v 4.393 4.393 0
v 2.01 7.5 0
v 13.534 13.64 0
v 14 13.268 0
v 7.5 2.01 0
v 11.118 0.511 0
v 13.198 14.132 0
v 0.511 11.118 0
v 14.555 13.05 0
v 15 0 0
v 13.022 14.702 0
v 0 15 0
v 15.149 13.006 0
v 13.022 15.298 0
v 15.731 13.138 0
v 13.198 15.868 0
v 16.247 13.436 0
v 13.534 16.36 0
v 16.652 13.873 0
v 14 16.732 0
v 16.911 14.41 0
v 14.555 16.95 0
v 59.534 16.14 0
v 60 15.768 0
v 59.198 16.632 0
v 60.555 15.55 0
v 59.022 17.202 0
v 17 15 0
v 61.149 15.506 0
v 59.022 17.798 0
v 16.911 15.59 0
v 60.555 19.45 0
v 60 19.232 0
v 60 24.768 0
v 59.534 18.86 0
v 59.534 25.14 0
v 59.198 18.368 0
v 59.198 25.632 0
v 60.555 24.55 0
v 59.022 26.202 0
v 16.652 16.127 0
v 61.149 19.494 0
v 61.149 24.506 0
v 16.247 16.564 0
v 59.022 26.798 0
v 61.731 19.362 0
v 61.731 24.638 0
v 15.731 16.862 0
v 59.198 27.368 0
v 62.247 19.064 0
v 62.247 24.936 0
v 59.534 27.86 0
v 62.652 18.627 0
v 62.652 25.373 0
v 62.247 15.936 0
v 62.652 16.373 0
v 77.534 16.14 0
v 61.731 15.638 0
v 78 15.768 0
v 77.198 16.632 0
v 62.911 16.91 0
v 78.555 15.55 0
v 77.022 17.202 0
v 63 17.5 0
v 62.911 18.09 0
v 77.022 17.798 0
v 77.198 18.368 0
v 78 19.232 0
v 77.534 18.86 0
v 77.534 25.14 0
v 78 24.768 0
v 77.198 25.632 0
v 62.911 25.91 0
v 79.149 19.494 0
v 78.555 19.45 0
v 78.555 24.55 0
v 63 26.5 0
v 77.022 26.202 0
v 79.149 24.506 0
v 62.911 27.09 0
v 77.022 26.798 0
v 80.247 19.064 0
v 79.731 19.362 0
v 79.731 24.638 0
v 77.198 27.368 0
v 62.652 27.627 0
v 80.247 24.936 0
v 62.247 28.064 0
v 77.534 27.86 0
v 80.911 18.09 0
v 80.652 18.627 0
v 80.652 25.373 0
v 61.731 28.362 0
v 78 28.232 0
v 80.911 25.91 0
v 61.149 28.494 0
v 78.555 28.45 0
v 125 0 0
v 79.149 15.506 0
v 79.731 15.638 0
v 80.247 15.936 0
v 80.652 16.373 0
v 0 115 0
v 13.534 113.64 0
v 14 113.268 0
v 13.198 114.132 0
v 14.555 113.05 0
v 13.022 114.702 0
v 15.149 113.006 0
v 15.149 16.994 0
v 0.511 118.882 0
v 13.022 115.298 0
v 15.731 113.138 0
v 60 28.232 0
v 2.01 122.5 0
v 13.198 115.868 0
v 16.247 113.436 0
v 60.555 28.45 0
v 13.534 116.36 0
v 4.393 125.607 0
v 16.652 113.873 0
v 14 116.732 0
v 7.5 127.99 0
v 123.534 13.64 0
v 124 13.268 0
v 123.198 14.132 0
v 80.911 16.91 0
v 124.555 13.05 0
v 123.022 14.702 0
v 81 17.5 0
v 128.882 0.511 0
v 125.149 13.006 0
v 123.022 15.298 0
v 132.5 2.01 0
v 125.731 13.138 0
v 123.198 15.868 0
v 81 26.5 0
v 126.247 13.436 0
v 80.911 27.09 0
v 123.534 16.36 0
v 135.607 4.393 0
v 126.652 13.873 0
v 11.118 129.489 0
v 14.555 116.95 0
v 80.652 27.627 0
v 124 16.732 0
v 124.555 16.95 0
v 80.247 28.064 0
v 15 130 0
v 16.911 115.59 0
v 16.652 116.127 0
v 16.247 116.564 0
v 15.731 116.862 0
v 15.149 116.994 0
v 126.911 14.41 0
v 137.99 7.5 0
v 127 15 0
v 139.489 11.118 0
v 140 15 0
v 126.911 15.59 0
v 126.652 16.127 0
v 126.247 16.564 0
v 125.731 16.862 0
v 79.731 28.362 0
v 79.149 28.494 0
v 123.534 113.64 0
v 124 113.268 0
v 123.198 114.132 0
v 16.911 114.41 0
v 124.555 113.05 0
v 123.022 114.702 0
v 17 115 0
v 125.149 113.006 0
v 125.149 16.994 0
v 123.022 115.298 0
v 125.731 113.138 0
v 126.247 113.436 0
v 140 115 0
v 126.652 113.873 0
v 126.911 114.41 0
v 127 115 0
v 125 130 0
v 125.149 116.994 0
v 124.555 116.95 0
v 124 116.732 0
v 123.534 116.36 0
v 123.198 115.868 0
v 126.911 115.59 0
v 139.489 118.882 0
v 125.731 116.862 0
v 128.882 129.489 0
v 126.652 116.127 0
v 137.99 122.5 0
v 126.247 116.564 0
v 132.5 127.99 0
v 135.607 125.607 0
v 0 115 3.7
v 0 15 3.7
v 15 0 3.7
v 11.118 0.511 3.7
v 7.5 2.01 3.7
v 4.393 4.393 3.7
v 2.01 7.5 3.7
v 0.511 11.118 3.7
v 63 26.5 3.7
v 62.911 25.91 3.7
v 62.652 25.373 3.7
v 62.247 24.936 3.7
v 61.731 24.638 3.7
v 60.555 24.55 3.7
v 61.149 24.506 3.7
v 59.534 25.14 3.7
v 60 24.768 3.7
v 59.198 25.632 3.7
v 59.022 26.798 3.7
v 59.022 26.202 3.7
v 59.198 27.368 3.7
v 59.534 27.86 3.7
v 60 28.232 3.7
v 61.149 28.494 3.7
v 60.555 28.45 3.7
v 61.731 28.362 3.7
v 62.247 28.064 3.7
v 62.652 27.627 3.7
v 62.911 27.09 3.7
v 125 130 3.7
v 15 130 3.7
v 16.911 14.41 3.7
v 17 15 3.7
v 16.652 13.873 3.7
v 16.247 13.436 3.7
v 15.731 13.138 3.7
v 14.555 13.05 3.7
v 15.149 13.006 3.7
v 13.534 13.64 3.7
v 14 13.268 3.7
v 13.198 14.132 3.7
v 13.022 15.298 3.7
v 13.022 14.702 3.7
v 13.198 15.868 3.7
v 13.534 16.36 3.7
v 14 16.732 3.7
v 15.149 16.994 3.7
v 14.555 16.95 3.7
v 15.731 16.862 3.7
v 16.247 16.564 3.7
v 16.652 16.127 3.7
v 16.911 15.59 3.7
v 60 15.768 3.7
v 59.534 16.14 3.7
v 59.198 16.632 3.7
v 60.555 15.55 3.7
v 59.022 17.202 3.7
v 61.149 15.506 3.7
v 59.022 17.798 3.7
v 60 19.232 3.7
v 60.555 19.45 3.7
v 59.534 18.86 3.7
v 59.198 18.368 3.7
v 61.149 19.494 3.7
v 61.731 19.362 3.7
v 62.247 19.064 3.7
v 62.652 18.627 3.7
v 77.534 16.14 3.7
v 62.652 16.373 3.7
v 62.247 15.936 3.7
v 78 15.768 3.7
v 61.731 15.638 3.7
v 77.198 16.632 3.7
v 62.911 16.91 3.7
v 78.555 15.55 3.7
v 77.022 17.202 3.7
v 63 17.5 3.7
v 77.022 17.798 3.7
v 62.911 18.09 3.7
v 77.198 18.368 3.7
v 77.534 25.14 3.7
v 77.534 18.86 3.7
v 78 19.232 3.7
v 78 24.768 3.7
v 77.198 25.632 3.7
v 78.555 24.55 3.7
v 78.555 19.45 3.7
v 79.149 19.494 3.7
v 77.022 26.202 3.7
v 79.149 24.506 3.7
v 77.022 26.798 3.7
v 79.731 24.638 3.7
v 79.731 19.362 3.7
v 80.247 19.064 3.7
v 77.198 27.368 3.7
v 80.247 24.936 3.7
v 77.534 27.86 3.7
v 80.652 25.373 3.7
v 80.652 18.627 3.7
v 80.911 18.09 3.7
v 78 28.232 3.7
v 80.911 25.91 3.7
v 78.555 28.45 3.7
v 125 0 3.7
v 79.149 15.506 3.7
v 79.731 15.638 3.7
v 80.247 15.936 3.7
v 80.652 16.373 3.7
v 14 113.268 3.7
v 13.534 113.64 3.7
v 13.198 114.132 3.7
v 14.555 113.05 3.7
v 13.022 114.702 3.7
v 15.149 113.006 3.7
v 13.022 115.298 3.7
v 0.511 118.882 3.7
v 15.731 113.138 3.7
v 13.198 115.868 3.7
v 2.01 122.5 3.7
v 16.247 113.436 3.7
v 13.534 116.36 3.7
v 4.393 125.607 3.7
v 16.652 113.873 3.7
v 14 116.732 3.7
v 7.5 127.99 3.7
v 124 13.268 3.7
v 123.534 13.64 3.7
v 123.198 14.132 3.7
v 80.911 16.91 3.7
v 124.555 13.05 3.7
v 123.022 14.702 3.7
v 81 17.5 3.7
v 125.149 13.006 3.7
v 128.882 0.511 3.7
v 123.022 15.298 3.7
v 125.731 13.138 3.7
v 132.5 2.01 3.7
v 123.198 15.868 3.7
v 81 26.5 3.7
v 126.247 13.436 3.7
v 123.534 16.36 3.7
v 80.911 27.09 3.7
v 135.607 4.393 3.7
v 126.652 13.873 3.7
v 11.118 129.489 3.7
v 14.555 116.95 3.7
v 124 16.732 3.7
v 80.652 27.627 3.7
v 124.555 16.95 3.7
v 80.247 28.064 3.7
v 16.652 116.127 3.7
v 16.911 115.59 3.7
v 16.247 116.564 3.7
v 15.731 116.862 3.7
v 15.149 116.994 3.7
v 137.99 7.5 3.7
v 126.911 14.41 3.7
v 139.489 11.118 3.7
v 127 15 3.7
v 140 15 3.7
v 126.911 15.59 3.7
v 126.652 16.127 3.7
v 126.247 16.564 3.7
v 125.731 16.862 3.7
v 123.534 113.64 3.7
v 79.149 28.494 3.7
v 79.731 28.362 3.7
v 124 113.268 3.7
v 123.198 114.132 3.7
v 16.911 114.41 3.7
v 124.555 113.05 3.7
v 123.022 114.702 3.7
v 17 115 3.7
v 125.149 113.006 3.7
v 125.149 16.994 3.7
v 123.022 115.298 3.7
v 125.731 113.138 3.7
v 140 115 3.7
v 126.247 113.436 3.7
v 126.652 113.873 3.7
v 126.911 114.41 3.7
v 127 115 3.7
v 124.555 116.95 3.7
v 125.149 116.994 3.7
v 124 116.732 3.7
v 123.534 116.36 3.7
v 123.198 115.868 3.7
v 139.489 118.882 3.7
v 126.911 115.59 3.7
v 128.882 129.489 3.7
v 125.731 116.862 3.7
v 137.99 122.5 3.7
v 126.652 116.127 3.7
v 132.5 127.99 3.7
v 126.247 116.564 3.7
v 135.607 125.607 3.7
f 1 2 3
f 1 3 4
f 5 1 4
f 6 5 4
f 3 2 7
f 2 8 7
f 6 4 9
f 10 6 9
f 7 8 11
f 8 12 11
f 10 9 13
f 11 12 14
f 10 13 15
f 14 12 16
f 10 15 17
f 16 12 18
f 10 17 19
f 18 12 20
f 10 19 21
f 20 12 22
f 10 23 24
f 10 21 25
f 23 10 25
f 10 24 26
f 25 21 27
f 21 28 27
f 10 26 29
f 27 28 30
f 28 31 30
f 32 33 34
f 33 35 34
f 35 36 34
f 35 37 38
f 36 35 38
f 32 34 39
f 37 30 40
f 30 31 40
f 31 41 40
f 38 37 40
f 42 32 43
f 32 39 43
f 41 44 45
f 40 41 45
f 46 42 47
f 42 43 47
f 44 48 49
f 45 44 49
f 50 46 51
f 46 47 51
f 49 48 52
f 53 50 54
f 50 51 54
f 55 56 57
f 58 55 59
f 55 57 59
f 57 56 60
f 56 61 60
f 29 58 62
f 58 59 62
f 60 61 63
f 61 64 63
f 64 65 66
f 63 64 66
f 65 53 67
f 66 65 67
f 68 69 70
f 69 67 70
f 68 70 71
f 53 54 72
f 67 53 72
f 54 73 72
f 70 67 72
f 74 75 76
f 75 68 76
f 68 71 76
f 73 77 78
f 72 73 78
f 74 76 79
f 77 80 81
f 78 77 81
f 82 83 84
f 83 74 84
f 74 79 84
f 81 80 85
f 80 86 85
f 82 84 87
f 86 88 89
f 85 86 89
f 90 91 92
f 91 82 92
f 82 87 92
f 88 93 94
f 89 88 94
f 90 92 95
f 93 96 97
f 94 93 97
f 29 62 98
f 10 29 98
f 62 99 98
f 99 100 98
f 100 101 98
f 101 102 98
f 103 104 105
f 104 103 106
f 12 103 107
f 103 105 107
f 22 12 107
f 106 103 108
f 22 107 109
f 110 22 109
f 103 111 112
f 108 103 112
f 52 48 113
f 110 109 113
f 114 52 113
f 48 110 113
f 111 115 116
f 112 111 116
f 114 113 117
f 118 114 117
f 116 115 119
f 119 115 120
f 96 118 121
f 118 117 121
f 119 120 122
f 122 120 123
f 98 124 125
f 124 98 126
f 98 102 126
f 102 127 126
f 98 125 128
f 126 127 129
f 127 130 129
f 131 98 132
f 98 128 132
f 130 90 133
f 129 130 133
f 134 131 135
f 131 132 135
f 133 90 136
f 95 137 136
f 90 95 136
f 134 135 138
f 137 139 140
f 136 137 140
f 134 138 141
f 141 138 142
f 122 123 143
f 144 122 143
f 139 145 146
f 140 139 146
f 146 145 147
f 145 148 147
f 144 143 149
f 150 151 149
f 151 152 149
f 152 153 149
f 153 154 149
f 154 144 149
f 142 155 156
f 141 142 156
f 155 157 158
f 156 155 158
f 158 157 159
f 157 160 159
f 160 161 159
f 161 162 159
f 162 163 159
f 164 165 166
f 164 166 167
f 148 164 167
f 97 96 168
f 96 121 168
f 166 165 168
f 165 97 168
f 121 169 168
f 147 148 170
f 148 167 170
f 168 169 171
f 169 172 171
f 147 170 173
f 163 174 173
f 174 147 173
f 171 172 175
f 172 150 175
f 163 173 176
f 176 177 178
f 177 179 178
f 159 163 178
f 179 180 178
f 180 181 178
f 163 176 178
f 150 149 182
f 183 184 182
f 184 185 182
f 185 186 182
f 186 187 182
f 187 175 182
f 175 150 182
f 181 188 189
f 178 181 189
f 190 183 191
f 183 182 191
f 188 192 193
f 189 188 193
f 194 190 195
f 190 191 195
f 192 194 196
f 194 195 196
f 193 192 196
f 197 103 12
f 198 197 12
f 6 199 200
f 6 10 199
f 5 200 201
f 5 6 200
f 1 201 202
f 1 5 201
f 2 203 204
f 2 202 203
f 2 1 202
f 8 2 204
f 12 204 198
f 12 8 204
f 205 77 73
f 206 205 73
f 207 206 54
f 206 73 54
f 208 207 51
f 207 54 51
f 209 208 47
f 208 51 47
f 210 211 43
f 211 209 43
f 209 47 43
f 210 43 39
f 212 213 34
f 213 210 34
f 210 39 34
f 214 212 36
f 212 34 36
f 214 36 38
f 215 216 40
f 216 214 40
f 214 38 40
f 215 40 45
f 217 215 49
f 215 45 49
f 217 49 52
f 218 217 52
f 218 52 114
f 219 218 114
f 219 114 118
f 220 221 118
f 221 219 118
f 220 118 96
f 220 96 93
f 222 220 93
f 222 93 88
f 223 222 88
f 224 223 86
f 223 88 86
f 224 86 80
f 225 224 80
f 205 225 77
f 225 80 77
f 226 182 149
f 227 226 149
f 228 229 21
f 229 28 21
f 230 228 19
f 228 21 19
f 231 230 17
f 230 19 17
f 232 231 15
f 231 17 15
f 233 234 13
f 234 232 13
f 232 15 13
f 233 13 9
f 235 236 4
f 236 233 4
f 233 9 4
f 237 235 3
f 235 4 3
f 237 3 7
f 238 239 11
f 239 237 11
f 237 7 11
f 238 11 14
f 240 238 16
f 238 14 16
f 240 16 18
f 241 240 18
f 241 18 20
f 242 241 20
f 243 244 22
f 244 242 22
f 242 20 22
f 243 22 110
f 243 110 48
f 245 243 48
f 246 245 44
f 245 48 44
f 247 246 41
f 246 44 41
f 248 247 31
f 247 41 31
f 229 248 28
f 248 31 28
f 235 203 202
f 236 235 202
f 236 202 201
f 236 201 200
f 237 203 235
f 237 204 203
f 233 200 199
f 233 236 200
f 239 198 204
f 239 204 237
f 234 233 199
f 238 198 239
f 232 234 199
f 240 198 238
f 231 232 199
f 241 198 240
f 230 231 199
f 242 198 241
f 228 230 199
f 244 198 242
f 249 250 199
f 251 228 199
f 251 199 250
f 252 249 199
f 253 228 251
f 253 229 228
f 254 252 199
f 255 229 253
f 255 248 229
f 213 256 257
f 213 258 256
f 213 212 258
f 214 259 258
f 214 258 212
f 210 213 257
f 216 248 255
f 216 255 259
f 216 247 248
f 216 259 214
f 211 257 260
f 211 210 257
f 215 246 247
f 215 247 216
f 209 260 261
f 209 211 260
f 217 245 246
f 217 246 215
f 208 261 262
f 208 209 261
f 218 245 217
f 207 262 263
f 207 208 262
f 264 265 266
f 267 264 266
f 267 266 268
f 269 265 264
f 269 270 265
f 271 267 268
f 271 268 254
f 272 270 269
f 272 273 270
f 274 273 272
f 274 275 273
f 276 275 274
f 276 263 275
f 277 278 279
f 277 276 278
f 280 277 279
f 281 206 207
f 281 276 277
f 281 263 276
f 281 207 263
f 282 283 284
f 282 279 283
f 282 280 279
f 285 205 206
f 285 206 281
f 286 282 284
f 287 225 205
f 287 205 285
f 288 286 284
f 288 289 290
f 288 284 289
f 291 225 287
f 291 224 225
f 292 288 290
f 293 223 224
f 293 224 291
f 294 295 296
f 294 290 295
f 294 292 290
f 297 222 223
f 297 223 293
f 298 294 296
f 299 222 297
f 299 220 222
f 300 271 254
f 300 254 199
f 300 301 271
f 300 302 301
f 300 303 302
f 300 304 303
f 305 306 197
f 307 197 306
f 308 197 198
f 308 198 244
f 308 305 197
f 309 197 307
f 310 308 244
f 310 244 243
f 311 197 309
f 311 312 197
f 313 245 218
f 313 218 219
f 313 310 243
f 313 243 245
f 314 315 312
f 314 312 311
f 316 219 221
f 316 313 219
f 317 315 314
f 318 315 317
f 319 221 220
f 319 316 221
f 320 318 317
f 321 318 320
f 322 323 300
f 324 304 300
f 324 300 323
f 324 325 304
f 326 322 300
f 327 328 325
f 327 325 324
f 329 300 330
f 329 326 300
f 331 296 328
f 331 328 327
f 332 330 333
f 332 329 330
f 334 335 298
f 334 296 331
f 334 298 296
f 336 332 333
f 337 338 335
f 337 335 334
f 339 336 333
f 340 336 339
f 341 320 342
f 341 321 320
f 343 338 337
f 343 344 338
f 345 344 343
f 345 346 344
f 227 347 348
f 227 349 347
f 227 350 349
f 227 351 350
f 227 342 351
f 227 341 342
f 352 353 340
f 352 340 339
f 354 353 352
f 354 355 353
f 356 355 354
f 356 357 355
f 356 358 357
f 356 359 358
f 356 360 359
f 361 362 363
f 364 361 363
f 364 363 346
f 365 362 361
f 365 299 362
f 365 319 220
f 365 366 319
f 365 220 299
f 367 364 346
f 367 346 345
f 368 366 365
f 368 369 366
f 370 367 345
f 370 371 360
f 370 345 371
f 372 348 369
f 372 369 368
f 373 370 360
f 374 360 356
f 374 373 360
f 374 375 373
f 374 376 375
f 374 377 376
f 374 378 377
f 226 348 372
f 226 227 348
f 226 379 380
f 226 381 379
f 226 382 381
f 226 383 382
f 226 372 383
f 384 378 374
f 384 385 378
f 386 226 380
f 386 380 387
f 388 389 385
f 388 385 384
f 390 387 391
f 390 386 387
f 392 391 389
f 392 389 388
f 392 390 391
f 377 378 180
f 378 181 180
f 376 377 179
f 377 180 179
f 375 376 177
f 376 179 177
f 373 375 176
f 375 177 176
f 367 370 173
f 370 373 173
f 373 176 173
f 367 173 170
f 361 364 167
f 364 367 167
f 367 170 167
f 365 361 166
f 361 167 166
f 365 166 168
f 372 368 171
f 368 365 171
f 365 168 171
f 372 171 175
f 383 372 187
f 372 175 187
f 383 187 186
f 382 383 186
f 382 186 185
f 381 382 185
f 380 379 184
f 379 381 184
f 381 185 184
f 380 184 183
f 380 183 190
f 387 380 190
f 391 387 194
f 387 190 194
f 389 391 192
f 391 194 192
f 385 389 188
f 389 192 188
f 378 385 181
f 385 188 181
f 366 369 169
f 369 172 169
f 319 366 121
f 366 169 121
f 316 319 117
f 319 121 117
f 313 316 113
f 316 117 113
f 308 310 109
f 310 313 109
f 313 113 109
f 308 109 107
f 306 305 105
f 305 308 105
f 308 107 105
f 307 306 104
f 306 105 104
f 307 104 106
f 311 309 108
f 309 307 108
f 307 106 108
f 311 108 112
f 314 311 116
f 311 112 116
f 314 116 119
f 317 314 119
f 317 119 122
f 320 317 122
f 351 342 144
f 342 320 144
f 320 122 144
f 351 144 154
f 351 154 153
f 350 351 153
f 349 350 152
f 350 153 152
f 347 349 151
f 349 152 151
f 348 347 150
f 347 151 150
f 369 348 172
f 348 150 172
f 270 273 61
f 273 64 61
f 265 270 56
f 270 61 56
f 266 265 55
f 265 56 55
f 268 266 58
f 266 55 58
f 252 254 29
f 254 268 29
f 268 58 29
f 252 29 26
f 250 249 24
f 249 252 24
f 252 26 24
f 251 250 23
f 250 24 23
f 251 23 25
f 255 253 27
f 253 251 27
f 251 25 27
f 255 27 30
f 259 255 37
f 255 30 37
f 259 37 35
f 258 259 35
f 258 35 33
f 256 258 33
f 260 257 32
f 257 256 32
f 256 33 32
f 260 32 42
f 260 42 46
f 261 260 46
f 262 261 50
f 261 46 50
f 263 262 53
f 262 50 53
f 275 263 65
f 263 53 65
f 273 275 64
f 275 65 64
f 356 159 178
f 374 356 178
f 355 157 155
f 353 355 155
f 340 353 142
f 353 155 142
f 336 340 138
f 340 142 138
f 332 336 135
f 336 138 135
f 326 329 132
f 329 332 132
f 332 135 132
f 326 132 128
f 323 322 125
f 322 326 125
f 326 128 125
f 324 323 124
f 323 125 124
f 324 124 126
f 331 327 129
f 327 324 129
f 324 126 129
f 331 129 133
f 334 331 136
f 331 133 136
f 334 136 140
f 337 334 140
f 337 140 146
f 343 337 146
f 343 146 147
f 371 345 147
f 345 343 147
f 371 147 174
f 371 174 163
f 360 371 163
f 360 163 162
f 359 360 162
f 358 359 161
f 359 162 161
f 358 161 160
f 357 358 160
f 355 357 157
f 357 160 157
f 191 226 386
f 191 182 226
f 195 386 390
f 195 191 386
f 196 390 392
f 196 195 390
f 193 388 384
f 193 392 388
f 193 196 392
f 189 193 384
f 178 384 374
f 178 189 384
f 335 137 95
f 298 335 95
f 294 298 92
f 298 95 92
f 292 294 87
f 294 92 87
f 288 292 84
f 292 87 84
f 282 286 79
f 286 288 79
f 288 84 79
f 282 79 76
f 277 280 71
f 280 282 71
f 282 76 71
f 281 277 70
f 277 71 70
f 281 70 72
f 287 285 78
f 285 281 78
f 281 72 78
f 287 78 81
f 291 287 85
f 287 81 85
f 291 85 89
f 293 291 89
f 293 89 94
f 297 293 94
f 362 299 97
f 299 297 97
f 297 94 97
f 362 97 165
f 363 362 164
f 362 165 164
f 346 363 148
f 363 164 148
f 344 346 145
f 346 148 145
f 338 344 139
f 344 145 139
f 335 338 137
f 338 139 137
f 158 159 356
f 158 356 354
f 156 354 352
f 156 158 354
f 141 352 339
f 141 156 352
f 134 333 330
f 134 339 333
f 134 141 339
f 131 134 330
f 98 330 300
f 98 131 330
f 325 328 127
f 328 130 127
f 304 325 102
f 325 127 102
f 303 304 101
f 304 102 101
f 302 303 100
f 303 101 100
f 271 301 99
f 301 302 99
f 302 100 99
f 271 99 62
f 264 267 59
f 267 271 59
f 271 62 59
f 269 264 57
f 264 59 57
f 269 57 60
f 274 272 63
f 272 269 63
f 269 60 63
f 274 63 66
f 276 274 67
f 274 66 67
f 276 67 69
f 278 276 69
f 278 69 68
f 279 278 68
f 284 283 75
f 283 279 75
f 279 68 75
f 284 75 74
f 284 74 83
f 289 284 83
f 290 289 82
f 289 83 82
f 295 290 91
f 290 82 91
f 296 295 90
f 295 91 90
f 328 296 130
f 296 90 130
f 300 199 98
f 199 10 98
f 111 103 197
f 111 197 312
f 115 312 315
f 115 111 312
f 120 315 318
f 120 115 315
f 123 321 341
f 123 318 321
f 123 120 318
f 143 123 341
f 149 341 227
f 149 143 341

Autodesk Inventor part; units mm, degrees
ref_plane "YZ Plane" through (0, 0, 0) normal (1, 0, 0) x (0, 1, 0)
ref_plane "XZ Plane" through (0, 0, 0) normal (0, 1, 0) x (-1, 0, 0)
ref_plane "XY Plane" through (0, 0, 0) normal (0, 0, 1) x (1, 0, 0)
sketch "Sketch1" plane through (0, 0, 0) normal (0, 0, 1) x (1, 0, 0)
  line L0 (15, 0) -> (125, 0)
  line L1 (140, 15) -> (140, 115)
  line L2 (125, 130) -> (15, 130)
  line L3 (0, 115) -> (0, 15)
  arc A0 (15, 130) -> (0, 115) centre (15, 115) ccw
  arc A1 (140, 115) -> (125, 130) centre (125, 115) ccw
  arc A2 (125, 0) -> (140, 15) centre (125, 15) ccw
  arc A3 (0, 15) -> (15, 0) centre (15, 15) ccw
  circle A4 centre (15, 115) radius 2
  circle A5 centre (125, 115) radius 2
  circle A6 centre (15, 15) radius 2
  circle A7 centre (125, 15) radius 2
  line L4 (61, 17.5) -> (79, 17.5) construction
  line L5 (79, 17.5) -> (79, 26.5) construction
  line L6 (79, 26.5) -> (61, 26.5) construction
  line L7 (61, 26.5) -> (61, 17.5) construction
  line L8 (61, 17.5) -> (79, 26.5) construction
  line L9 (79, 17.5) -> (61, 26.5) construction
  line L10 (70, 0) -> (70, 130) construction
  circle A8 centre (61, 26.5) radius 2
  circle A9 centre (61, 17.5) radius 2
  circle A10 centre (79, 26.5) radius 2
  circle A11 centre (79, 17.5) radius 2
  point P0 (0, 0)
  point P1 (140, 130)
  point P2 (140, 0)
  point P3 (0, 130)
  point P4 (70, 22)
  point P5 (70, 17.5)
  dimension "d0" = 140
  dimension "d1" = 130
  dimension "d2" = 15
  dimension "d3" = 4
  dimension "d4" = 4
  dimension "d5" = 4
  dimension "d6" = 4
  dimension "d7" = 18
  dimension "d8" = 9
  dimension "d9" = 17.5
  dimension "d11" = 4
  dimension "d12" = 4
extrude "Extrusion1" add sketch "Sketch1" along normal blind 3.7
properties part number "Base" material "PMMA Plastic"
